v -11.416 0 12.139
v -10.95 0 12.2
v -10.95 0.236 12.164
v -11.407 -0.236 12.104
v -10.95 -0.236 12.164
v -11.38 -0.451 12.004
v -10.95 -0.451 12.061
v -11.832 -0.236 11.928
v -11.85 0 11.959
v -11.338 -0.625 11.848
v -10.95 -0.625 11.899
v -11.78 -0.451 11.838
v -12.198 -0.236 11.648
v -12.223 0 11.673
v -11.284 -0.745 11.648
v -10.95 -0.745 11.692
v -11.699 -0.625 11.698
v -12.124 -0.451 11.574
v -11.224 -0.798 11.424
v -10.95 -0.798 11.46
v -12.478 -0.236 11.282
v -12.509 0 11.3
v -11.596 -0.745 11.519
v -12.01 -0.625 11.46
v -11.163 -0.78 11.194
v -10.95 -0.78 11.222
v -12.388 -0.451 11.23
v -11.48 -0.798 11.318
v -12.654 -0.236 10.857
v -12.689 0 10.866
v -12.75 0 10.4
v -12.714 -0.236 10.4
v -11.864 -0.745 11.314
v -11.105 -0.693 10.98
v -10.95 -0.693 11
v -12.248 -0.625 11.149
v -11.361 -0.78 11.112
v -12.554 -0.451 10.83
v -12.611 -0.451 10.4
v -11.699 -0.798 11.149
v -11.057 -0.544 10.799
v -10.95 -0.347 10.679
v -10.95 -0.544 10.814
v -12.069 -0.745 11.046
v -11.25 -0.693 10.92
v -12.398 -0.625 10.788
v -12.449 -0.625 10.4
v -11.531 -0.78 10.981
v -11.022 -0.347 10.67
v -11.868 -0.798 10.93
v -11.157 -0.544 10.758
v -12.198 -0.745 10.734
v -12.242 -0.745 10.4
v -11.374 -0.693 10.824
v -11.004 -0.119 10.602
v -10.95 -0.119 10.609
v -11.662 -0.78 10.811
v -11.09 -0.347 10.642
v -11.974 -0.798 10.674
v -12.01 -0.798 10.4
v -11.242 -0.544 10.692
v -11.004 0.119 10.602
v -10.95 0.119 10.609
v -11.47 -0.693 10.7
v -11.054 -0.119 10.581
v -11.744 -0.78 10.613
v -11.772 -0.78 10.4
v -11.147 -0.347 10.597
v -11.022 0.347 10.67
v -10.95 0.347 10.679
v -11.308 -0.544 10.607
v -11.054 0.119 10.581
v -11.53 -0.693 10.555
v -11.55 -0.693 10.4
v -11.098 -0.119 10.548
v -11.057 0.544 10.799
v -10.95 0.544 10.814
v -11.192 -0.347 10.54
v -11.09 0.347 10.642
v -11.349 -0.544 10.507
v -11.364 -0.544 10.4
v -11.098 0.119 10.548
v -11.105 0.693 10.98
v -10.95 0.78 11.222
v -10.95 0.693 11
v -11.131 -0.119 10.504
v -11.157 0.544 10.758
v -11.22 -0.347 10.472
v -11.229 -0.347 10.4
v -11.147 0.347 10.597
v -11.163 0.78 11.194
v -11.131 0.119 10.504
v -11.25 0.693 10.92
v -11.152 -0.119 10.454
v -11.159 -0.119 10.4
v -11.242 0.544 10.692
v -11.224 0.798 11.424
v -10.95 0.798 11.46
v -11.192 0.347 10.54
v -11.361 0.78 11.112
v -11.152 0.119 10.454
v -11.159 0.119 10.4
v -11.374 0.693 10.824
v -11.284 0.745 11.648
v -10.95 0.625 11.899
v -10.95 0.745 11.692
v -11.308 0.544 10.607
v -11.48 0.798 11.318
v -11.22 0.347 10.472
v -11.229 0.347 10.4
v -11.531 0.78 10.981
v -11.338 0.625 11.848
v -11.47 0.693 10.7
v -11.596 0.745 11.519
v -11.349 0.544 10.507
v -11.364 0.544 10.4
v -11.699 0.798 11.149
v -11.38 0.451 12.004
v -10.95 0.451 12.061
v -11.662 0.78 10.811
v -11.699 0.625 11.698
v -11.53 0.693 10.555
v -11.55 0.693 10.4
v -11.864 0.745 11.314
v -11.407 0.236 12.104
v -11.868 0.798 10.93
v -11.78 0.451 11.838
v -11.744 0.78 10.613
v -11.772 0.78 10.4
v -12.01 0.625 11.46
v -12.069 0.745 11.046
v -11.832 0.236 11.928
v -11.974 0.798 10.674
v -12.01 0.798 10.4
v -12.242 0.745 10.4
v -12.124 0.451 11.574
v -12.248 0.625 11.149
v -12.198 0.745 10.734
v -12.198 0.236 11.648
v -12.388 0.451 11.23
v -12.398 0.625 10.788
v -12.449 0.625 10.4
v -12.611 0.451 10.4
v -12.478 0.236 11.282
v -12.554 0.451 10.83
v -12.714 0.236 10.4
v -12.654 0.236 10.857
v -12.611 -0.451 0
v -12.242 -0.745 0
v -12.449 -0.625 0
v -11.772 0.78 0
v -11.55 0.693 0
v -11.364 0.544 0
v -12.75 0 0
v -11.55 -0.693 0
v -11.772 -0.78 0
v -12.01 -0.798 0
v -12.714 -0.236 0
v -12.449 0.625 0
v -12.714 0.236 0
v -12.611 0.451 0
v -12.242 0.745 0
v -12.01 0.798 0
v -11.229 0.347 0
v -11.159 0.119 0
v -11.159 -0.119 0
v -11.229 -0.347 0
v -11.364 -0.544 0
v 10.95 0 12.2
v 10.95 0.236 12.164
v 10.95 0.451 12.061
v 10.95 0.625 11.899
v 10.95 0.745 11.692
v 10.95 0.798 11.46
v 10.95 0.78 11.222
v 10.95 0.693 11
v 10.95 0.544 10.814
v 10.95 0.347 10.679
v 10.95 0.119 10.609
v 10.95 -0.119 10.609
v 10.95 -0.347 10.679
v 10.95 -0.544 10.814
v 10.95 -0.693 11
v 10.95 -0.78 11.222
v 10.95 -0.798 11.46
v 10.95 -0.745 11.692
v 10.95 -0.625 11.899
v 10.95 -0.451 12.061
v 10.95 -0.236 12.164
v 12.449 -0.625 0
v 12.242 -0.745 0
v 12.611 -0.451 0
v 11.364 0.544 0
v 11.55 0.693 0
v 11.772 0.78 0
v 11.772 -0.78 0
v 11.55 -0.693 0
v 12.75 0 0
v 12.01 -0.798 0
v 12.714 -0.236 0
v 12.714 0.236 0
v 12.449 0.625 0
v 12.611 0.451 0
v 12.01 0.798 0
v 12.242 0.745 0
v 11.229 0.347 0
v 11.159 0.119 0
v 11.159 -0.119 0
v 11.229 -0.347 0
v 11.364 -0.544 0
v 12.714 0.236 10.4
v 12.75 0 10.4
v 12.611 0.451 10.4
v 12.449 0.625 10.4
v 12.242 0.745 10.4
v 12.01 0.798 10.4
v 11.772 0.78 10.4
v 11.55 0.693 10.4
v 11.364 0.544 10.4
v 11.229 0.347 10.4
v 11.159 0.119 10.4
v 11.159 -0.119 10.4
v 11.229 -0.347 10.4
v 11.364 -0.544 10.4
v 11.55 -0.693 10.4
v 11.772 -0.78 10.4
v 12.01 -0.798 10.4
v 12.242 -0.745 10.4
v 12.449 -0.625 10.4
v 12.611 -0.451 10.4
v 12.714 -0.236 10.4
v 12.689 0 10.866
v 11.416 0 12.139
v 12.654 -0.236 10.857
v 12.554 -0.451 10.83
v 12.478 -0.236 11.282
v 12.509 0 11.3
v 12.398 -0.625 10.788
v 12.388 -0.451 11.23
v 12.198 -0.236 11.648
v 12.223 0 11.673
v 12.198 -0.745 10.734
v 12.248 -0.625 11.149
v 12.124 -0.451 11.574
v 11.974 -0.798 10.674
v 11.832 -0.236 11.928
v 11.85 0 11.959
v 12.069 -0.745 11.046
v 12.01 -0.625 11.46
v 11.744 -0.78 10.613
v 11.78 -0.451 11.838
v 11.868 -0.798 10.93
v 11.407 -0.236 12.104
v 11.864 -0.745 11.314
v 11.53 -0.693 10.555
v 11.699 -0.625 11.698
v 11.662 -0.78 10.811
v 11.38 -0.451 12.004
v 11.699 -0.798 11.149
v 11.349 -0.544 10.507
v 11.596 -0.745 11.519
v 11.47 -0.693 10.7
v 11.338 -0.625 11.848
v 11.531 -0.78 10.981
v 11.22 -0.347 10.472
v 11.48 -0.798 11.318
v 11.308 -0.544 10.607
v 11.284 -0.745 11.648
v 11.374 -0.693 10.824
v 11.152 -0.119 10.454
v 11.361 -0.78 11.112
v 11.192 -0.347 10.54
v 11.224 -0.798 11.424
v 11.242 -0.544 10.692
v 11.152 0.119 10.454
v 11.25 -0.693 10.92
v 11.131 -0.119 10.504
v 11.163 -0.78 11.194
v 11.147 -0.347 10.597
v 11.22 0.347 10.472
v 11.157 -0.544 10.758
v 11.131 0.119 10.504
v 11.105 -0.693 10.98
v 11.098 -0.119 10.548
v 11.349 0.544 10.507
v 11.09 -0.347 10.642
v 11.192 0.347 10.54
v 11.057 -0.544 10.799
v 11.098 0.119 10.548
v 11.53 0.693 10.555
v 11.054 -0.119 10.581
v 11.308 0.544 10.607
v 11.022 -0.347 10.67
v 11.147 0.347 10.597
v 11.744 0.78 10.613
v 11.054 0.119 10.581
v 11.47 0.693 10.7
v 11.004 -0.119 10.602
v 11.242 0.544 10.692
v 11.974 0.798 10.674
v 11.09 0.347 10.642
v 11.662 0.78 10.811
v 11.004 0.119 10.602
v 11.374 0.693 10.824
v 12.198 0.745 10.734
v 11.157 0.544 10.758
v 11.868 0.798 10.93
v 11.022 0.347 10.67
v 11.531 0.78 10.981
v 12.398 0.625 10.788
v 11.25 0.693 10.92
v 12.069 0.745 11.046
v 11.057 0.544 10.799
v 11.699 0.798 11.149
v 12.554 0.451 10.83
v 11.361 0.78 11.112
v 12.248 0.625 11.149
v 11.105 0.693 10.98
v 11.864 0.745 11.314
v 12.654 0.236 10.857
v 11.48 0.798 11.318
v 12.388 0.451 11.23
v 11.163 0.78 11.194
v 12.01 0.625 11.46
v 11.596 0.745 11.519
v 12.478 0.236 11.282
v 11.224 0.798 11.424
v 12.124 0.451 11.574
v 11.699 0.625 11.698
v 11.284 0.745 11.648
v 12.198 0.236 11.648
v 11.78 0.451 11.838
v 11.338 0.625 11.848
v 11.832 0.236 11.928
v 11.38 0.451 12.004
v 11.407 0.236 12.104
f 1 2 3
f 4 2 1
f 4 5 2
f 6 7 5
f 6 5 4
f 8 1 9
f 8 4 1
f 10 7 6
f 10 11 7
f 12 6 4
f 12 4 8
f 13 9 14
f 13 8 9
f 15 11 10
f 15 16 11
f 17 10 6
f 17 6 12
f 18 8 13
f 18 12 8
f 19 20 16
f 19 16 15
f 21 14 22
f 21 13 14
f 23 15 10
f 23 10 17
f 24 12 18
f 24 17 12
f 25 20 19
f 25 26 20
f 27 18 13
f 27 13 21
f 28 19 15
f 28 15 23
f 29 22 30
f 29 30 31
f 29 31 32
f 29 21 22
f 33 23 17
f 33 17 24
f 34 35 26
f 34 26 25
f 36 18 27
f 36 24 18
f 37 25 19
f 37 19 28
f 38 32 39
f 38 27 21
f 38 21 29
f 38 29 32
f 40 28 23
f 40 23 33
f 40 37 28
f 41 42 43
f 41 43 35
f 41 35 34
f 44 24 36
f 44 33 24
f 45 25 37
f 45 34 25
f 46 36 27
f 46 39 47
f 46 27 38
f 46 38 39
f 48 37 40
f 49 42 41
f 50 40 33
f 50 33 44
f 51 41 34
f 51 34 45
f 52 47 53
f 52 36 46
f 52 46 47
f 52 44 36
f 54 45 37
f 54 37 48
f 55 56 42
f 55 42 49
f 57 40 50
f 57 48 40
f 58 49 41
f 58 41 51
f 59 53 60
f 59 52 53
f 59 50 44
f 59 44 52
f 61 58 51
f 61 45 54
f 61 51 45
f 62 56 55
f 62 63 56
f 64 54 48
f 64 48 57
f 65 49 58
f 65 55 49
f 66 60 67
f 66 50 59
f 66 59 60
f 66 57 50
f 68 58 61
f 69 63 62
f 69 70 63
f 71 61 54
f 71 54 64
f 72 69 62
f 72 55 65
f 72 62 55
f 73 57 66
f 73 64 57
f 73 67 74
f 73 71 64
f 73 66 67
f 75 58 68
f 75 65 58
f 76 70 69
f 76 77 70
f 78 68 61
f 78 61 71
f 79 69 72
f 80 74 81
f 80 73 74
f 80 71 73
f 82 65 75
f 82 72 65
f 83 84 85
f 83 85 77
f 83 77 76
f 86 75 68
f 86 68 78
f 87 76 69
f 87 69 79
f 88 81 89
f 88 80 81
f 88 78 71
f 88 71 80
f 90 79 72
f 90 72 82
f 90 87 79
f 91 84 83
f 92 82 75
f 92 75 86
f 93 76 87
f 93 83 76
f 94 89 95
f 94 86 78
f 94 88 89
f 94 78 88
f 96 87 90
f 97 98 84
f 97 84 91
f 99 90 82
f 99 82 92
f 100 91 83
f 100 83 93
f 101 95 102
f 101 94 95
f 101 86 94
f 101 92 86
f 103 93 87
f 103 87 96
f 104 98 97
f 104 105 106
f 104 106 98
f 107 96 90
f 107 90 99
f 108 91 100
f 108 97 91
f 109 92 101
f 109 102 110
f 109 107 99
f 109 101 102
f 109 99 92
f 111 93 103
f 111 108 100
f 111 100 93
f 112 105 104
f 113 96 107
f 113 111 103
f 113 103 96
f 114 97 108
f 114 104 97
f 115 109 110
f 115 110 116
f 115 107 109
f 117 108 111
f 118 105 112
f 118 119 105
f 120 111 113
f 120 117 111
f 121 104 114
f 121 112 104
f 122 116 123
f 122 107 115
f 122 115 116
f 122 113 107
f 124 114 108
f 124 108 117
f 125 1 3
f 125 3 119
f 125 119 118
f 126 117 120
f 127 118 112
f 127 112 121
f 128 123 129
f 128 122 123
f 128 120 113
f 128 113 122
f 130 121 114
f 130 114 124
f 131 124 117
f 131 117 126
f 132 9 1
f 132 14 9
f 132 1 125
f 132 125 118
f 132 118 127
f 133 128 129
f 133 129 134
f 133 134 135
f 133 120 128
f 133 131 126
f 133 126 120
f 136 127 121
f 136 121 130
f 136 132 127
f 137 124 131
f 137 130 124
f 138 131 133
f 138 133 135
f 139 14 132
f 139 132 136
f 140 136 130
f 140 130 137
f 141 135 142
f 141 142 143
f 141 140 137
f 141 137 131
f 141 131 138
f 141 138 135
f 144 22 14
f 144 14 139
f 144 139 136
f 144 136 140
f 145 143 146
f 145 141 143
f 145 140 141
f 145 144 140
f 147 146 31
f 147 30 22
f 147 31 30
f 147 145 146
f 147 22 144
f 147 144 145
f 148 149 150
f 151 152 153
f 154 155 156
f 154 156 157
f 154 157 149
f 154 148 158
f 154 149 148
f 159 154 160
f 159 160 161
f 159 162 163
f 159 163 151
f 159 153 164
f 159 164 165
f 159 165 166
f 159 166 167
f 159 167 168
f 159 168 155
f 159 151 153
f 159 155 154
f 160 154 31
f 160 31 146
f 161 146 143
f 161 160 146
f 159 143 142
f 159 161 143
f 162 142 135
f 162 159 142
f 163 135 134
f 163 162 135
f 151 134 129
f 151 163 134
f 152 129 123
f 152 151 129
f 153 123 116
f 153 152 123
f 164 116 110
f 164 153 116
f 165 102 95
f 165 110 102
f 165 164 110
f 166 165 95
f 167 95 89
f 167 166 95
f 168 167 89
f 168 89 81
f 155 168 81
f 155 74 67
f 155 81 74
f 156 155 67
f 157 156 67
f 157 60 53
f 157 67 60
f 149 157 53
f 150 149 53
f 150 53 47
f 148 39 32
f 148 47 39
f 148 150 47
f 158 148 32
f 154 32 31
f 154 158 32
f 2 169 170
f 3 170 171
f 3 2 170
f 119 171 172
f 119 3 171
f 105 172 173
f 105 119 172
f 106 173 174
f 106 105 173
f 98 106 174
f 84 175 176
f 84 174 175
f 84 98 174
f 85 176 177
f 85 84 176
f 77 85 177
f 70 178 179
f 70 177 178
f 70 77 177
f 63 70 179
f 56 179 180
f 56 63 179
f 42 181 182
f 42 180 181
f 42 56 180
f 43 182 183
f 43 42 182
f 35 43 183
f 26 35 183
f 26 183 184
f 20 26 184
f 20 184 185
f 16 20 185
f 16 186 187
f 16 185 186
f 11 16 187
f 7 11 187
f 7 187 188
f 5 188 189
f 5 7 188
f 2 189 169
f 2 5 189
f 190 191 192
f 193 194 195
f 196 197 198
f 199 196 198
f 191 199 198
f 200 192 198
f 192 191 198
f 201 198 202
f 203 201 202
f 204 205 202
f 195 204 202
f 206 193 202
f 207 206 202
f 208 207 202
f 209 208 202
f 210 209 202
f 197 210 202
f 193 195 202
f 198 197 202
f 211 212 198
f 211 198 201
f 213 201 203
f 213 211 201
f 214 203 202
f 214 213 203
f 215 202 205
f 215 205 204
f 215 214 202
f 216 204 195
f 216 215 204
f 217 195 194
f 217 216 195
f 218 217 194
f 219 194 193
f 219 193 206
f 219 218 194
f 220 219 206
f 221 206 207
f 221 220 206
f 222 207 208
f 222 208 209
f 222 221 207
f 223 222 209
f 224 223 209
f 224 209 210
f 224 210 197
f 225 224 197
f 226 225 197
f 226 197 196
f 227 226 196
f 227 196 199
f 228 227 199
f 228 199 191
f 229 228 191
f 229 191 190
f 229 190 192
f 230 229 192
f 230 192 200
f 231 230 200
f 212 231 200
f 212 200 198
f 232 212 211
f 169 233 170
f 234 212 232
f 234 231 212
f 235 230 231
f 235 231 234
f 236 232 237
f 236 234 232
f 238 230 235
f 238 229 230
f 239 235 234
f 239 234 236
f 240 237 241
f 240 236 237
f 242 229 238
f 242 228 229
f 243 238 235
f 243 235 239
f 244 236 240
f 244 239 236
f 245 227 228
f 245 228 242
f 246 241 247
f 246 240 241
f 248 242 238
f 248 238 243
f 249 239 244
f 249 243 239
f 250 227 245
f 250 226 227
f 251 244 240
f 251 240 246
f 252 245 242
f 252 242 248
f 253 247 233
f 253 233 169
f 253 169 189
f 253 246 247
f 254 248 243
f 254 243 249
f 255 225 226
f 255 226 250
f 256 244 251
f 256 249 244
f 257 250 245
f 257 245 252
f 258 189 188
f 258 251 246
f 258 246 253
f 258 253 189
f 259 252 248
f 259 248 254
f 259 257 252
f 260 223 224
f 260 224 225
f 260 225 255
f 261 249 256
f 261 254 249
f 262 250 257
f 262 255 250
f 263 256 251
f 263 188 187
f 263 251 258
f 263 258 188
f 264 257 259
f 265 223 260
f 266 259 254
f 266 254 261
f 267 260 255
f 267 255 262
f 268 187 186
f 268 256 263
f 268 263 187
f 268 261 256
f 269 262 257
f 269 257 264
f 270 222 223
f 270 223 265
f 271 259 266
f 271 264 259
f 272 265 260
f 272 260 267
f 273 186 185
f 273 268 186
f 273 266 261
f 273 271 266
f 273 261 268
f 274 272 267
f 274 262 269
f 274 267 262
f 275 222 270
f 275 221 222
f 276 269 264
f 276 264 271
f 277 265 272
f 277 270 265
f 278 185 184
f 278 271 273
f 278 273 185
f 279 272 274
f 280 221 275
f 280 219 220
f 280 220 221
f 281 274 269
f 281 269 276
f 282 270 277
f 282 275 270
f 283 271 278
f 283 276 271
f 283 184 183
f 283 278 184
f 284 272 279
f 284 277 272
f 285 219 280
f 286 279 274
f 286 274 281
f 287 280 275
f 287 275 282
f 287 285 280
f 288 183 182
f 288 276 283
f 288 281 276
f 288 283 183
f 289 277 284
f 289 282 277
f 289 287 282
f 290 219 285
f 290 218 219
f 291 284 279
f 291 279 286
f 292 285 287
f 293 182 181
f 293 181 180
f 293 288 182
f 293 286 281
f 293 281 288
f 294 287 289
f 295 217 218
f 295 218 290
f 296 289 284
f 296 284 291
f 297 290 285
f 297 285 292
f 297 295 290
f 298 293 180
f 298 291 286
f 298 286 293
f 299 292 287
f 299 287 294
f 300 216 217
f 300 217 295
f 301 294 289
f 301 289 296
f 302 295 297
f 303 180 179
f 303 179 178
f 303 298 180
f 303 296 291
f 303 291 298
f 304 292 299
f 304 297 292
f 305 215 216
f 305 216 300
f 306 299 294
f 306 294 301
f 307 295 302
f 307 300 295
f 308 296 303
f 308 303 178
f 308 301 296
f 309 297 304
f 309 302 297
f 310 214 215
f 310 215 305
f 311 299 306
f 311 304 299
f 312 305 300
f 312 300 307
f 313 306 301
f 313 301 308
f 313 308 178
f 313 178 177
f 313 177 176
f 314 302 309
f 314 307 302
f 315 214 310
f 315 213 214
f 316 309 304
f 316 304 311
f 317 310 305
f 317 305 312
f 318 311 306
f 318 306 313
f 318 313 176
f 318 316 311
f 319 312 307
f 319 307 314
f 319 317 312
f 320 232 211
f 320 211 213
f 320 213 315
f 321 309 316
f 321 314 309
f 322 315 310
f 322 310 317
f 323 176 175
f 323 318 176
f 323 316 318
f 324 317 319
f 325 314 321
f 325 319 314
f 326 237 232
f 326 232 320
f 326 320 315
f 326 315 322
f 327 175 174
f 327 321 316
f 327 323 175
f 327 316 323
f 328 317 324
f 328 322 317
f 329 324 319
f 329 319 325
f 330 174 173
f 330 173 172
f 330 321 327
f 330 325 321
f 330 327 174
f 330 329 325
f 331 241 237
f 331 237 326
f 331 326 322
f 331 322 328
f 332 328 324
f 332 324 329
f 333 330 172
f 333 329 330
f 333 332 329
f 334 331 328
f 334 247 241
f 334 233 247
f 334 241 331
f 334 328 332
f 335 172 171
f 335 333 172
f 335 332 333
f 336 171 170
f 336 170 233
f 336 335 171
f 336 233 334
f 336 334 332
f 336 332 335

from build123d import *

# Parameters (mm, degrees)
SWEEP1_PROFILE_R = 0.8


with BuildPart() as part:
    # Sweep1: sweep along a path in Sketch1
    with BuildLine(Plane(origin=(0, 0, 0), x_dir=(1, 0, 0), z_dir=(0, 1, 0))) as sweep1_path:
        Line((11.95, 0), (11.95, -10.4))
        ThreePointArc((11.95, -10.4), (11.657106781, -11.107106781), (10.95, -11.4))
        Line((10.95, -11.4), (-10.95, -11.4))
        ThreePointArc((-10.95, -11.4), (-11.657106781, -11.107106781), (-11.95, -10.4))
        Line((-11.95, -10.4), (-11.95, 0))
    # Sweep1 profile (on start of the path) → Sweep1 (sweep)
    with BuildSketch(Plane(origin=(11.95, 0, 0), x_dir=(1, 0, 0), z_dir=(0, 0, 1))):
        Circle(SWEEP1_PROFILE_R)
    sweep(path=sweep1_path.line)


solid = part.part
